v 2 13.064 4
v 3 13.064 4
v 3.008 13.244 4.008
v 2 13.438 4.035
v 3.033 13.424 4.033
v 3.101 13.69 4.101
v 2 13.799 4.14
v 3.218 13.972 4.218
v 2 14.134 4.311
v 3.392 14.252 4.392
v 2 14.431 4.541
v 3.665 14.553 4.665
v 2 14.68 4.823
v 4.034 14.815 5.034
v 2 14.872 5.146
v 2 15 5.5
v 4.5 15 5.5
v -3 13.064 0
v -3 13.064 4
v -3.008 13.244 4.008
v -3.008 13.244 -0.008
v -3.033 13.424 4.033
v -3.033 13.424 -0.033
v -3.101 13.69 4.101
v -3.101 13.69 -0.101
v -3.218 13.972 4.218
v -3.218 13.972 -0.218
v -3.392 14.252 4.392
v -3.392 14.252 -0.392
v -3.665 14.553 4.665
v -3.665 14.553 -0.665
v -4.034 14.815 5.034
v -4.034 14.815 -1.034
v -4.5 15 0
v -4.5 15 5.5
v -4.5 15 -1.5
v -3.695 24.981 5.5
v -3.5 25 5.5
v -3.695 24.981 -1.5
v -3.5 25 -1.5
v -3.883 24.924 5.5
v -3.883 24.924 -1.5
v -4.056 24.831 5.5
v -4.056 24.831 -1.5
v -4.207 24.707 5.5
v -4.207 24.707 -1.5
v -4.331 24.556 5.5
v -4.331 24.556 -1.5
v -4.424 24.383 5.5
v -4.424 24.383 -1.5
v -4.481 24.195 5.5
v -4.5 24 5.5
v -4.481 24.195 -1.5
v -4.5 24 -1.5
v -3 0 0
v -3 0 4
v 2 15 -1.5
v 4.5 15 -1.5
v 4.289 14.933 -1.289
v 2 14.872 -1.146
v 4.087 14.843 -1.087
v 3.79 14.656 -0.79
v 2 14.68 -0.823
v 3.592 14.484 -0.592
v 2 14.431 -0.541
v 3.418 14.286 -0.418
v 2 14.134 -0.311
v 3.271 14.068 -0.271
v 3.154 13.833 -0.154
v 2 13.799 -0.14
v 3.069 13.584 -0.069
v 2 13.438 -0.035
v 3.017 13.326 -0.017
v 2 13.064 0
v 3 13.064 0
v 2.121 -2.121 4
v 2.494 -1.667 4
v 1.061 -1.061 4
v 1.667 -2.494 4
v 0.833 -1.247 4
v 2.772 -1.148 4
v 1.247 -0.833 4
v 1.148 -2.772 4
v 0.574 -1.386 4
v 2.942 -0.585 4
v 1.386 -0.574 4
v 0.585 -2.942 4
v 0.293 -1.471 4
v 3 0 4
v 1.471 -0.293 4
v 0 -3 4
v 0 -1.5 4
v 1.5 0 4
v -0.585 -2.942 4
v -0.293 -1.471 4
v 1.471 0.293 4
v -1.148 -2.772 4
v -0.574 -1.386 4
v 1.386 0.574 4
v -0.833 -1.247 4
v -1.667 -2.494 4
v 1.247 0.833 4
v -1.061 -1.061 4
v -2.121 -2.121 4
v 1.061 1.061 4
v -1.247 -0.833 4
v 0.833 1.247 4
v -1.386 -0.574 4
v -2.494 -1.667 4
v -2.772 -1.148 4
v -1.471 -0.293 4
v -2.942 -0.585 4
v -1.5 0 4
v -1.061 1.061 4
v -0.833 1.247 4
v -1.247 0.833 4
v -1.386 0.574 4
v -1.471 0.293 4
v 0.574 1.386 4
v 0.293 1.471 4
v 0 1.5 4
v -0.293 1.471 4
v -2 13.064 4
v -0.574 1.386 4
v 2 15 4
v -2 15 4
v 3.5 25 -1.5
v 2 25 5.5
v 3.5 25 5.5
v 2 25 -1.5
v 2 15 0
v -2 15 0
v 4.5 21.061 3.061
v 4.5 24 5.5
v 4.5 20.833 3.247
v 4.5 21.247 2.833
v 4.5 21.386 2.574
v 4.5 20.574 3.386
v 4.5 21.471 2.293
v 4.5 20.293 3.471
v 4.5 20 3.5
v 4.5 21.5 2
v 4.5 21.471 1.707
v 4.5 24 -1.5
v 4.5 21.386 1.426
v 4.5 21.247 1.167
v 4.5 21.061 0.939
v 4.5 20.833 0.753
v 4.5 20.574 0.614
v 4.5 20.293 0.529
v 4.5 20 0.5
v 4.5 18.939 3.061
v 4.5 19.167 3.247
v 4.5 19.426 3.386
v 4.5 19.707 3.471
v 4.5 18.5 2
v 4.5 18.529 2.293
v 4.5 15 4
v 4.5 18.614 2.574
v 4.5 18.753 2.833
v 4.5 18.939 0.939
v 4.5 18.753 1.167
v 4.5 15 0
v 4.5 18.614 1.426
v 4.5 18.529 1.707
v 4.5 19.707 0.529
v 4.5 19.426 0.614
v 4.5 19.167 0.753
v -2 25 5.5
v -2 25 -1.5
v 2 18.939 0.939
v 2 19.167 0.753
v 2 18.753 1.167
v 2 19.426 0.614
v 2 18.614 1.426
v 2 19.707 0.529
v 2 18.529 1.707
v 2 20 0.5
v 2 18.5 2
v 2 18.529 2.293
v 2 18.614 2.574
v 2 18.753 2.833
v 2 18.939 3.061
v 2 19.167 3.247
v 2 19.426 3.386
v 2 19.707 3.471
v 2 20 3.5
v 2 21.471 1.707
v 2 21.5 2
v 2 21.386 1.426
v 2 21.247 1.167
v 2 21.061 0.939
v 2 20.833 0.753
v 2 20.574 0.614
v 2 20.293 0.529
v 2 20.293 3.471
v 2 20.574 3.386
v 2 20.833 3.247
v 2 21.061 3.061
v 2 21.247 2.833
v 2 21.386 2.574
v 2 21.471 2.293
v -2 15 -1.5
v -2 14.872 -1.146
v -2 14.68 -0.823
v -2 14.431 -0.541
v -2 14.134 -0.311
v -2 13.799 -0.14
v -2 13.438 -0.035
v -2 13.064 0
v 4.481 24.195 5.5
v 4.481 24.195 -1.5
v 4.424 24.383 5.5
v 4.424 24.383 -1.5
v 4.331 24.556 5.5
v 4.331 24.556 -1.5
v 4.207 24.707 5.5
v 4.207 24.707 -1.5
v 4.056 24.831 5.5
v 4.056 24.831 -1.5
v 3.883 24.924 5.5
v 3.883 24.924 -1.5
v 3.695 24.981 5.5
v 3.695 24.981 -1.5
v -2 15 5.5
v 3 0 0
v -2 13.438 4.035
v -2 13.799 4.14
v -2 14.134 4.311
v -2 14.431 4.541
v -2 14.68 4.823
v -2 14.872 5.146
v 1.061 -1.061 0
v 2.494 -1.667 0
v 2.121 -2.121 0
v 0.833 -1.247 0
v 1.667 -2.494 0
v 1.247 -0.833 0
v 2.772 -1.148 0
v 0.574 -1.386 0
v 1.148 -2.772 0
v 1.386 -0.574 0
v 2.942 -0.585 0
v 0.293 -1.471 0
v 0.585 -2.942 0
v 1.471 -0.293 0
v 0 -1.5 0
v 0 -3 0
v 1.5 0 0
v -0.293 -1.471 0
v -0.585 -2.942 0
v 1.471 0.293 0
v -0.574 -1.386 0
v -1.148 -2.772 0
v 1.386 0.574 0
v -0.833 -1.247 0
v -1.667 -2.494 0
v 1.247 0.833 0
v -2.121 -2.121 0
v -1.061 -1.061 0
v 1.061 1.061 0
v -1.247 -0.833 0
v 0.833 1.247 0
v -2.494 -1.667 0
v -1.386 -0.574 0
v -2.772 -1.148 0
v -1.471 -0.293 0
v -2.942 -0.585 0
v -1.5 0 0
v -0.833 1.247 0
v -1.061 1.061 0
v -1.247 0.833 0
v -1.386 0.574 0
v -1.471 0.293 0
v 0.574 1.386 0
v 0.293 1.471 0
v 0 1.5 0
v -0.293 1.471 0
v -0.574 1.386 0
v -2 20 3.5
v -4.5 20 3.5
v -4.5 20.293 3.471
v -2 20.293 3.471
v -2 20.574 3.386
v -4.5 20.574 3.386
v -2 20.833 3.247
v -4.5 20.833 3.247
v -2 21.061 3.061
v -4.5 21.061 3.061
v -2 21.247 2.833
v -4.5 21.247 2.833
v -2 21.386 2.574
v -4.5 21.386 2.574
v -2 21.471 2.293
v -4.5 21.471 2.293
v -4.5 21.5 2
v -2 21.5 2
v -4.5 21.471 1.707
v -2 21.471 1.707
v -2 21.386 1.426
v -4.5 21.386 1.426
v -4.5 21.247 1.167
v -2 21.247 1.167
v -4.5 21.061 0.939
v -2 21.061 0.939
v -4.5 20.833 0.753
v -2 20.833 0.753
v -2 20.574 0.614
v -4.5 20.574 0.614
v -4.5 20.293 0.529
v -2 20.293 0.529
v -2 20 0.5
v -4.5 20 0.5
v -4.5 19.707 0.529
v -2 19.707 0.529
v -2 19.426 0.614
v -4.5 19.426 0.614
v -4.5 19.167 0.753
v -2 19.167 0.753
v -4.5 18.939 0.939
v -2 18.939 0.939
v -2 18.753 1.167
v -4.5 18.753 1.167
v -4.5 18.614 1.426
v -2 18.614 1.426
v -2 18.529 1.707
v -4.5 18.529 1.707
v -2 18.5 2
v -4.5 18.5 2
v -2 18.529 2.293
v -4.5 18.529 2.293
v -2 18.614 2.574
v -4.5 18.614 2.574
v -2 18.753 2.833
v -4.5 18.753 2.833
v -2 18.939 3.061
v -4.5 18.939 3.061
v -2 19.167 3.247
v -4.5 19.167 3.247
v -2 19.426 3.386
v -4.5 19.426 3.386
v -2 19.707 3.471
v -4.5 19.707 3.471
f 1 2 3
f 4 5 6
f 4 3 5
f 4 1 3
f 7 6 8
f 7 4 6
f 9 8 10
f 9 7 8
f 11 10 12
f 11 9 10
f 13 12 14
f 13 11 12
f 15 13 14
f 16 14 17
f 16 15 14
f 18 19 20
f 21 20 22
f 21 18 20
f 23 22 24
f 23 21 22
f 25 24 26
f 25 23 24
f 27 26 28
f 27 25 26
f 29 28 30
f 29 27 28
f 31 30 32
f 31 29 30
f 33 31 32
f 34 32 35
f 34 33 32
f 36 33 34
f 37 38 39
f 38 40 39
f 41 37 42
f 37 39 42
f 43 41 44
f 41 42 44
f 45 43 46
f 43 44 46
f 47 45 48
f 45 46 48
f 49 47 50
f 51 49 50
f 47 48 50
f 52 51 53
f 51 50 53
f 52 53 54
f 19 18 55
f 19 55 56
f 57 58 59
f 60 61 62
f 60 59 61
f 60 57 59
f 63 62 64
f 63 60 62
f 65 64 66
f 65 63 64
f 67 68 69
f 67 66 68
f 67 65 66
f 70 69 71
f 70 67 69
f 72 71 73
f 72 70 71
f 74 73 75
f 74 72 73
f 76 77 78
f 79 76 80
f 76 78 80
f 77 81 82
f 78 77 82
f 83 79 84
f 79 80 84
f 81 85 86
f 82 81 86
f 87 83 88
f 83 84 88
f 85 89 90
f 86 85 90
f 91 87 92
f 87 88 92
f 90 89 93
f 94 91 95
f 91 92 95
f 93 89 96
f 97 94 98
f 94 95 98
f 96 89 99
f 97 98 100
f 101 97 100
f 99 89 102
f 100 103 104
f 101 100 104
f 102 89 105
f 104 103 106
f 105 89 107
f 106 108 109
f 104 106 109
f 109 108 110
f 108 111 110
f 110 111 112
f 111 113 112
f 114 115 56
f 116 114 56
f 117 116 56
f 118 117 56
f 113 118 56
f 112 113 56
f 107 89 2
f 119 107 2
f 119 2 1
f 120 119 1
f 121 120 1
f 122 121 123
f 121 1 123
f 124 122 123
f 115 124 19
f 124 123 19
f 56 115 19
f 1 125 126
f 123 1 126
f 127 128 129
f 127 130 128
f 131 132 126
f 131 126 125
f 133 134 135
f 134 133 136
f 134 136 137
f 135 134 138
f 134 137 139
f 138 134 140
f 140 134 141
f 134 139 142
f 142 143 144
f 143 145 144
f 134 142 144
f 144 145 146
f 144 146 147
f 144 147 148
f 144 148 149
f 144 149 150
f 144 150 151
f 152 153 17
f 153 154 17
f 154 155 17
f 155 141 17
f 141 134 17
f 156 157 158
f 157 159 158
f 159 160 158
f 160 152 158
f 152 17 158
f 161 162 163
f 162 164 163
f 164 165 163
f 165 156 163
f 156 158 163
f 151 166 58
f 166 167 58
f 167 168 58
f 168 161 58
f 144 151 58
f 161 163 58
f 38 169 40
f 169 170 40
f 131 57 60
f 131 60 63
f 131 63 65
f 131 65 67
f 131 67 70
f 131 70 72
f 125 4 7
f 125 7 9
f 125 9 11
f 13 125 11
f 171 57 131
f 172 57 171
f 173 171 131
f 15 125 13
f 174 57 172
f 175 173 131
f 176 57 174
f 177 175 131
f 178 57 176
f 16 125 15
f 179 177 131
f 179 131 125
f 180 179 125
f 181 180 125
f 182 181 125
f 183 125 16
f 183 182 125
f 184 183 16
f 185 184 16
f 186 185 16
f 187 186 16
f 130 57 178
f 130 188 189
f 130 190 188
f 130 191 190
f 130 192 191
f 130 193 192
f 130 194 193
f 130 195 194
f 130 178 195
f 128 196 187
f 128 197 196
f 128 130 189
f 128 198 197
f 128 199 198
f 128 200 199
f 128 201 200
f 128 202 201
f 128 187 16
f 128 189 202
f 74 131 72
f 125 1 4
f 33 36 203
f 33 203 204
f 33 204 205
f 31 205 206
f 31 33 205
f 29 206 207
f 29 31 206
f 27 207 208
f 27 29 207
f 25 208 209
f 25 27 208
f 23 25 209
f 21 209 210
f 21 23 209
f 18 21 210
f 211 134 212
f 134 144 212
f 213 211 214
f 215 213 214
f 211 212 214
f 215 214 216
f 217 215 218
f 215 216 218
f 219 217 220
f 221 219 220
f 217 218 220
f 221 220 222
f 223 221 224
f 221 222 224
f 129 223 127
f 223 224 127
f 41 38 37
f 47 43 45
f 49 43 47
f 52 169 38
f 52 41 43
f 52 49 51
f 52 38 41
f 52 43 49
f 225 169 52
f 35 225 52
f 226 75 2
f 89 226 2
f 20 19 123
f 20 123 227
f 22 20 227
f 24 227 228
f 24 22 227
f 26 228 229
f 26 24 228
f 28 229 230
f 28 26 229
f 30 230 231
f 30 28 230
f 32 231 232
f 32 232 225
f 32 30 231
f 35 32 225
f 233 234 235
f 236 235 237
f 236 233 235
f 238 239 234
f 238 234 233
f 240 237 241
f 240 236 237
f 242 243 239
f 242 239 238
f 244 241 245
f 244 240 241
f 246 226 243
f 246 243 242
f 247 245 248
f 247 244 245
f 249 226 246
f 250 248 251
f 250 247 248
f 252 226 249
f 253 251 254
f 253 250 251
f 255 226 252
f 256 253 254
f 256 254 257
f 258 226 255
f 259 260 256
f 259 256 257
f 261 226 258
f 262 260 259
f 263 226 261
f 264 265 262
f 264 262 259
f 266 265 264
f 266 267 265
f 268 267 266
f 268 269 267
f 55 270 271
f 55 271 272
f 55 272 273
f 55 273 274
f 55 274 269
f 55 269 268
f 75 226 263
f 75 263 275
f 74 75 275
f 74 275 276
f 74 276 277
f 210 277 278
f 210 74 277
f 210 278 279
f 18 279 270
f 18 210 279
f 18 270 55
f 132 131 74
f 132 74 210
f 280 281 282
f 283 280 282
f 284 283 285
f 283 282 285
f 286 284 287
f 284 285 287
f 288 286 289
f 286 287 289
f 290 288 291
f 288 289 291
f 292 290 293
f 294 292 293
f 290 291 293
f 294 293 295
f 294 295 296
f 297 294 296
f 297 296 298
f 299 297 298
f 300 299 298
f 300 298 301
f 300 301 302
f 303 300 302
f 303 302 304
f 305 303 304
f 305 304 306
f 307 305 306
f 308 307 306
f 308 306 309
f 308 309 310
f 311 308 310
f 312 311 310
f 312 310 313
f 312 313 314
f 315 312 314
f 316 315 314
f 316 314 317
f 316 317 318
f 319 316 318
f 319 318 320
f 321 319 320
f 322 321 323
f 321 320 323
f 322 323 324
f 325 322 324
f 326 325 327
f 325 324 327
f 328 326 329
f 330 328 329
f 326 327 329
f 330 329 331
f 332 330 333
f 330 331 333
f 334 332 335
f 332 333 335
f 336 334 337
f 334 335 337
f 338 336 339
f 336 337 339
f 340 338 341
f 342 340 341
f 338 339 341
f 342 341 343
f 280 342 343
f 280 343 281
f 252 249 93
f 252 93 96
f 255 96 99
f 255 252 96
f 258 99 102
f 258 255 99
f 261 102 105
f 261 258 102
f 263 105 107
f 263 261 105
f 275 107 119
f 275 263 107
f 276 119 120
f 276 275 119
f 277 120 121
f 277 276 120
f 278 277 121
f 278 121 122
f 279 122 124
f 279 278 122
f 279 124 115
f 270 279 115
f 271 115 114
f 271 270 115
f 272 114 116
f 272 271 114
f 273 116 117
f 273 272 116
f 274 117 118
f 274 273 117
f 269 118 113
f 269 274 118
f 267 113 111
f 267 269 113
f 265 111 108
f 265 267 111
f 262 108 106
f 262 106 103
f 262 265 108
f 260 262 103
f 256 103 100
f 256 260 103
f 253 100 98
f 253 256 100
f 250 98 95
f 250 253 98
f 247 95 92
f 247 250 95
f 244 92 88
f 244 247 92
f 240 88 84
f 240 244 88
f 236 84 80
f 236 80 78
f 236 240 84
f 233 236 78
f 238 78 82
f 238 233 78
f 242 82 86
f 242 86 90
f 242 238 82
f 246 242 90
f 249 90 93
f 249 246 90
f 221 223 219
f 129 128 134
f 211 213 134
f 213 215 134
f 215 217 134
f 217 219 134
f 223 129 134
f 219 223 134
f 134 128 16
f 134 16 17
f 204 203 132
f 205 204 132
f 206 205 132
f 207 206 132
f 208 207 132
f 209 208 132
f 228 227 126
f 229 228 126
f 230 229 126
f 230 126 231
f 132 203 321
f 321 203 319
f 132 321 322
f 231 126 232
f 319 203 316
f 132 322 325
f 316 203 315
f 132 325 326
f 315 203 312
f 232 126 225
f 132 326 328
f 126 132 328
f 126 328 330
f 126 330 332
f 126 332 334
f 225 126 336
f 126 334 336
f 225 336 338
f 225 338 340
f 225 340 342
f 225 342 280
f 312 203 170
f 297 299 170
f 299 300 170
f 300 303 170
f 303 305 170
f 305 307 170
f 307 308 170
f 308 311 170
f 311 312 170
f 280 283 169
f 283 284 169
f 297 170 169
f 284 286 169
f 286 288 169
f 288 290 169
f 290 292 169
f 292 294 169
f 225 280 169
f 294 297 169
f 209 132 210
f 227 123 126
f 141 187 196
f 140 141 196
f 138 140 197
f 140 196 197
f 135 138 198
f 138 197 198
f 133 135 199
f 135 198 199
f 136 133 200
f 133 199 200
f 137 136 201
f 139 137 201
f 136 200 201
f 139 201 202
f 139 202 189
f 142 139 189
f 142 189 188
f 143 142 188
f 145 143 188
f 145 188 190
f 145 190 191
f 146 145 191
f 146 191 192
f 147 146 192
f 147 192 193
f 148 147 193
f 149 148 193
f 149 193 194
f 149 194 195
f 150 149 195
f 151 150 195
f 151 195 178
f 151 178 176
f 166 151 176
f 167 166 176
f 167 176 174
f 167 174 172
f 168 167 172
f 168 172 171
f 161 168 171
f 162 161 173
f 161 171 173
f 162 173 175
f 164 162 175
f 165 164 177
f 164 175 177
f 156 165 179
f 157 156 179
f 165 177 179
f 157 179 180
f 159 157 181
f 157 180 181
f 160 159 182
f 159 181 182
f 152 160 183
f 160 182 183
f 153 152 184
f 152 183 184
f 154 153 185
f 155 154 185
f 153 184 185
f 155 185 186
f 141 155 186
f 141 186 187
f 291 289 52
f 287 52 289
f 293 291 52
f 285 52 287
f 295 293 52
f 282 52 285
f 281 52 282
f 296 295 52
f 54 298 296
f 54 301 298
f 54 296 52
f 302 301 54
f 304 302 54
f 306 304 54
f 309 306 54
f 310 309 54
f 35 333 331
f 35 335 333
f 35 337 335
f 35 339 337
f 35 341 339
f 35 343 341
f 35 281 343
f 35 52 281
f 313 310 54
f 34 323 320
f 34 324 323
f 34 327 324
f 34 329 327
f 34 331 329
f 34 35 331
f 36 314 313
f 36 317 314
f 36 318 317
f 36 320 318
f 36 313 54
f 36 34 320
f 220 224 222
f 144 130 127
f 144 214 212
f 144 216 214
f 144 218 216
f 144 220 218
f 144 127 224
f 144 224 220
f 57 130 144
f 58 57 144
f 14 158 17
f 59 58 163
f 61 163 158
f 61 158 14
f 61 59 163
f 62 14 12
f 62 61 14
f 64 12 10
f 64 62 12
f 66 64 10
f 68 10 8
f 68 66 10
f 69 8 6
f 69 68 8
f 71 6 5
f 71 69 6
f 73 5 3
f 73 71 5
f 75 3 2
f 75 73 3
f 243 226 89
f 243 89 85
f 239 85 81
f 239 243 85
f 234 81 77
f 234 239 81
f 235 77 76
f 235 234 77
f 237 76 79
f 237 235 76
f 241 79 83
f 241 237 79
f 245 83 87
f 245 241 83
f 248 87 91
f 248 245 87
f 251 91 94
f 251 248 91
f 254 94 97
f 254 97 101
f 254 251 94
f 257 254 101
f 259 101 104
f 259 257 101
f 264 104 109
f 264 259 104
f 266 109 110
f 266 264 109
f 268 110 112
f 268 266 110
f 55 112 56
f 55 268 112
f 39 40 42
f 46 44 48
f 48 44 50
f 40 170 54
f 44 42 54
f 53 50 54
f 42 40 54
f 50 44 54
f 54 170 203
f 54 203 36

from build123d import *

# Parameters (mm, degrees)
SKETCH1_R           = 1.5
BOSS_EXTRUDE1_DEPTH = 4
SKETCH2_W           = 2.5
SKETCH2_H           = 7
BOSS_EXTRUDE2_DEPTH = 10
FILLET5_R           = 2
FILLET6_R           = 2
SKETCH3_R           = 1.5
CUT_EXTRUDE1_DEPTH  = 10
FILLET8_R           = 1


with BuildPart() as part:
    # Sketch1 → Boss-Extrude1 (new body)
    with BuildSketch(Plane.XY):
        with BuildLine():
            Line((-3, 0), (-3, 15))
            Line((-3, 15), (3, 15))
            Line((3, 15), (3, 0))
            ThreePointArc((3, 0), (0, -3), (-3, 0))
        make_face()
        Circle(SKETCH1_R, mode=Mode.SUBTRACT)
    extrude(amount=BOSS_EXTRUDE1_DEPTH)

    # Sketch2 → Boss-Extrude2 (add)
    with BuildSketch(Plane(origin=(0, 15, 0), x_dir=(1, 0, 0), z_dir=(0, 1, 0))):
        with Locations((3.25, -2)):
            Rectangle(SKETCH2_W, SKETCH2_H)
    boss_extrude2 = extrude(amount=BOSS_EXTRUDE2_DEPTH)

    # Mirror3: Boss-Extrude2 across plane
    add(boss_extrude2.mirror(Plane(origin=(0, 0, 0), x_dir=(0, 0, 1), z_dir=(1, 0, 0))))

    # Fillet5
    # the kernel refuses this fillet: 2 mm, written as the material it adds along each edge
    with BuildSketch(Plane(origin=(-3, 15, 4), x_dir=(0, 0, 1), z_dir=(1, 0, 0))) as fillet5_piece_1:
        with BuildLine():
            CenterArc((2, 1.936491673), FILLET5_R, 180, 75.522487814)
            Line((0, 1.936491673), (0, 0))
            Line((0, 0), (1.5, 0))
        make_face()
    extrude(amount=1)
    with BuildSketch(Plane(origin=(-3, 15, 0), x_dir=(0, 0, -1), z_dir=(1, 0, 0))) as fillet5_piece_2:
        with BuildLine():
            CenterArc((2, -1.936491673), FILLET5_R, 104.477512186, 75.522487814)
            Line((0, -1.936491673), (0, 0))
            Line((0, 0), (1.5, 0))
        make_face()
    extrude(amount=1)
    with BuildSketch(Plane(origin=(-3, 15, 0), x_dir=(0, -1, 0), z_dir=(0, 0, 1))) as fillet5_piece_3:
        with BuildLine():
            CenterArc((1.936491673, -2), FILLET5_R, 90, 75.522487814)
            Line((0, -1.5), (0, 0))
            Line((0, 0), (1.936491673, 0))
        make_face()
    extrude(amount=4)
    with BuildSketch(Plane(origin=(-3, 15, 0), x_dir=(0, -1, 0), z_dir=(0, 0, 1))) as fillet5_piece_4a_section:
        with BuildLine():
            CenterArc((1.936491673, -2), FILLET5_R, 90, 75.522487814)
            Line((0, -1.5), (0, 0))
            Line((0, 0), (1.936491673, 0))
        make_face()
    fillet5_piece_4a = extrude(amount=8.841229183, mode=Mode.PRIVATE)
    fillet5_piece_4a = split(fillet5_piece_4a, bisect_by=Plane(origin=(-3, 15, 4), z_dir=(0, 0, 1)), keep=Keep.TOP, mode=Mode.PRIVATE)
    fillet5_piece_4a = split(fillet5_piece_4a, bisect_by=Plane(origin=(-3, 15, 5.5), z_dir=(0, 0, -1)), keep=Keep.TOP, mode=Mode.PRIVATE)
    with BuildSketch(Plane(origin=(-7.841229183, 15, 4), x_dir=(0, 0, 1), z_dir=(1, 0, 0))) as fillet5_piece_4b_section:
        with BuildLine():
            CenterArc((2, 1.936491673), FILLET5_R, 180, 75.522487814)
            Line((0, 1.936491673), (0, 0))
            Line((0, 0), (1.5, 0))
        make_face()
    fillet5_piece_4b = extrude(amount=5.841229183, mode=Mode.PRIVATE)
    fillet5_piece_4b = split(fillet5_piece_4b, bisect_by=Plane(origin=(-3, 15, 4), z_dir=(-1, 0, 0)), keep=Keep.TOP, mode=Mode.PRIVATE)
    fillet5_piece_4b = split(fillet5_piece_4b, bisect_by=Plane(origin=(-4.5, 15, 4), z_dir=(1, 0, 0)), keep=Keep.TOP, mode=Mode.PRIVATE)
    fillet5_piece_4 = fillet5_piece_4a & fillet5_piece_4b
    add(fillet5_piece_4)
    with BuildSketch(Plane(origin=(-3, 15, -4.841229183), x_dir=(0, -1, 0), z_dir=(0, 0, 1))) as fillet5_piece_5a_section:
        with BuildLine():
            CenterArc((1.936491673, -2), FILLET5_R, 90, 75.522487814)
            Line((0, -1.5), (0, 0))
            Line((0, 0), (1.936491673, 0))
        make_face()
    fillet5_piece_5a = extrude(amount=8.841229183, mode=Mode.PRIVATE)
    fillet5_piece_5a = split(fillet5_piece_5a, bisect_by=Plane(origin=(-3, 15, 0), z_dir=(0, 0, -1)), keep=Keep.TOP, mode=Mode.PRIVATE)
    fillet5_piece_5a = split(fillet5_piece_5a, bisect_by=Plane(origin=(-3, 15, -1.5), z_dir=(0, 0, 1)), keep=Keep.TOP, mode=Mode.PRIVATE)
    with BuildSketch(Plane(origin=(-7.841229183, 15, 0), x_dir=(0, 0, -1), z_dir=(1, 0, 0))) as fillet5_piece_5b_section:
        with BuildLine():
            CenterArc((2, -1.936491673), FILLET5_R, 104.477512186, 75.522487814)
            Line((0, -1.936491673), (0, 0))
            Line((0, 0), (1.5, 0))
        make_face()
    fillet5_piece_5b = extrude(amount=5.841229183, mode=Mode.PRIVATE)
    fillet5_piece_5b = split(fillet5_piece_5b, bisect_by=Plane(origin=(-3, 15, 0), z_dir=(-1, 0, 0)), keep=Keep.TOP, mode=Mode.PRIVATE)
    fillet5_piece_5b = split(fillet5_piece_5b, bisect_by=Plane(origin=(-4.5, 15, 0), z_dir=(1, 0, 0)), keep=Keep.TOP, mode=Mode.PRIVATE)
    fillet5_piece_5 = fillet5_piece_5a & fillet5_piece_5b
    add(fillet5_piece_5)

    # Fillet6
    # the kernel refuses this fillet: 2 mm, written as the material it adds along each edge
    with BuildSketch(Plane(origin=(2, 15, 4), x_dir=(0, -1, 0), z_dir=(1, 0, 0))) as fillet6_piece_1:
        with BuildLine():
            CenterArc((1.936491673, -2), FILLET6_R, 90, 75.522487814)
            Line((0, -1.5), (0, 0))
            Line((0, 0), (1.936491673, 0))
        make_face()
    extrude(amount=1)
    with BuildSketch(Plane(origin=(2, 15, 0), x_dir=(0, 0, -1), z_dir=(1, 0, 0))) as fillet6_piece_2:
        with BuildLine():
            CenterArc((2, -1.936491673), FILLET6_R, 104.477512186, 75.522487814)
            Line((0, -1.936491673), (0, 0))
            Line((0, 0), (1.5, 0))
        make_face()
    extrude(amount=1)
    with BuildSketch(Plane(origin=(3, 15, 0), x_dir=(1, 0, 0), z_dir=(0, 0, 1))) as fillet6_piece_3:
        with BuildLine():
            CenterArc((2, -1.936491673), FILLET6_R, 104.477512186, 75.522487814)
            Line((0, -1.936491673), (0, 0))
            Line((0, 0), (1.5, 0))
        make_face()
    extrude(amount=4)
    with BuildSketch(Plane(origin=(2, 15, 4), x_dir=(0, -1, 0), z_dir=(1, 0, 0))) as fillet6_piece_4a_section:
        with BuildLine():
            CenterArc((1.936491673, -2), FILLET6_R, 90, 75.522487814)
            Line((0, -1.5), (0, 0))
            Line((0, 0), (1.936491673, 0))
        make_face()
    fillet6_piece_4a = extrude(amount=5.841229183, mode=Mode.PRIVATE)
    fillet6_piece_4a = split(fillet6_piece_4a, bisect_by=Plane(origin=(4.5, 15, 4), z_dir=(-1, 0, 0)), keep=Keep.TOP, mode=Mode.PRIVATE)
    fillet6_piece_4a = split(fillet6_piece_4a, bisect_by=Plane(origin=(3, 15, 4), z_dir=(1, 0, 0)), keep=Keep.TOP, mode=Mode.PRIVATE)
    with BuildSketch(Plane(origin=(3, 15, 0), x_dir=(1, 0, 0), z_dir=(0, 0, 1))) as fillet6_piece_4b_section:
        with BuildLine():
            CenterArc((2, -1.936491673), FILLET6_R, 104.477512186, 75.522487814)
            Line((0, -1.936491673), (0, 0))
            Line((0, 0), (1.5, 0))
        make_face()
    fillet6_piece_4b = extrude(amount=8.841229183, mode=Mode.PRIVATE)
    fillet6_piece_4b = split(fillet6_piece_4b, bisect_by=Plane(origin=(3, 15, 4), z_dir=(0, 0, 1)), keep=Keep.TOP, mode=Mode.PRIVATE)
    fillet6_piece_4b = split(fillet6_piece_4b, bisect_by=Plane(origin=(3, 15, 5.5), z_dir=(0, 0, -1)), keep=Keep.TOP, mode=Mode.PRIVATE)
    fillet6_piece_4 = fillet6_piece_4a & fillet6_piece_4b
    add(fillet6_piece_4)
    with BuildSketch(Plane(origin=(2, 15, 0), x_dir=(0, 0, -1), z_dir=(1, 0, 0))) as fillet6_piece_5a_section:
        with BuildLine():
            CenterArc((2, -1.936491673), FILLET6_R, 104.477512186, 75.522487814)
            Line((0, -1.936491673), (0, 0))
            Line((0, 0), (1.5, 0))
        make_face()
    fillet6_piece_5a = extrude(amount=5.841229183, mode=Mode.PRIVATE)
    fillet6_piece_5a = split(fillet6_piece_5a, bisect_by=Plane(origin=(4.5, 15, 0), z_dir=(-1, 0, 0)), keep=Keep.TOP, mode=Mode.PRIVATE)
    fillet6_piece_5a = split(fillet6_piece_5a, bisect_by=Plane(origin=(3, 15, 0), z_dir=(1, 0, 0)), keep=Keep.TOP, mode=Mode.PRIVATE)
    with BuildSketch(Plane(origin=(3, 15, -4.841229183), x_dir=(1, 0, 0), z_dir=(0, 0, 1))) as fillet6_piece_5b_section:
        with BuildLine():
            CenterArc((2, -1.936491673), FILLET6_R, 104.477512186, 75.522487814)
            Line((0, -1.936491673), (0, 0))
            Line((0, 0), (1.5, 0))
        make_face()
    fillet6_piece_5b = extrude(amount=8.841229183, mode=Mode.PRIVATE)
    fillet6_piece_5b = split(fillet6_piece_5b, bisect_by=Plane(origin=(3, 15, -1.5), z_dir=(0, 0, 1)), keep=Keep.TOP, mode=Mode.PRIVATE)
    fillet6_piece_5b = split(fillet6_piece_5b, bisect_by=Plane(origin=(3, 15, 0), z_dir=(0, 0, -1)), keep=Keep.TOP, mode=Mode.PRIVATE)
    fillet6_piece_5 = fillet6_piece_5a & fillet6_piece_5b
    add(fillet6_piece_5)

    # Sketch3 → Cut-Extrude1 (cut)
    with BuildSketch(Plane.ZY.offset(4.5)):
        with Locations((2, 20)):
            Circle(SKETCH3_R)
    extrude(amount=-CUT_EXTRUDE1_DEPTH, mode=Mode.SUBTRACT)

    # Fillet8
    fillet8_edges = [part.edges().sort_by_distance(p)[0] for p in [
        (4.5, 25, 2),
        (-4.5, 25, 2),
    ]]
    fillet(fillet8_edges, radius=FILLET8_R)


solid = part.part
